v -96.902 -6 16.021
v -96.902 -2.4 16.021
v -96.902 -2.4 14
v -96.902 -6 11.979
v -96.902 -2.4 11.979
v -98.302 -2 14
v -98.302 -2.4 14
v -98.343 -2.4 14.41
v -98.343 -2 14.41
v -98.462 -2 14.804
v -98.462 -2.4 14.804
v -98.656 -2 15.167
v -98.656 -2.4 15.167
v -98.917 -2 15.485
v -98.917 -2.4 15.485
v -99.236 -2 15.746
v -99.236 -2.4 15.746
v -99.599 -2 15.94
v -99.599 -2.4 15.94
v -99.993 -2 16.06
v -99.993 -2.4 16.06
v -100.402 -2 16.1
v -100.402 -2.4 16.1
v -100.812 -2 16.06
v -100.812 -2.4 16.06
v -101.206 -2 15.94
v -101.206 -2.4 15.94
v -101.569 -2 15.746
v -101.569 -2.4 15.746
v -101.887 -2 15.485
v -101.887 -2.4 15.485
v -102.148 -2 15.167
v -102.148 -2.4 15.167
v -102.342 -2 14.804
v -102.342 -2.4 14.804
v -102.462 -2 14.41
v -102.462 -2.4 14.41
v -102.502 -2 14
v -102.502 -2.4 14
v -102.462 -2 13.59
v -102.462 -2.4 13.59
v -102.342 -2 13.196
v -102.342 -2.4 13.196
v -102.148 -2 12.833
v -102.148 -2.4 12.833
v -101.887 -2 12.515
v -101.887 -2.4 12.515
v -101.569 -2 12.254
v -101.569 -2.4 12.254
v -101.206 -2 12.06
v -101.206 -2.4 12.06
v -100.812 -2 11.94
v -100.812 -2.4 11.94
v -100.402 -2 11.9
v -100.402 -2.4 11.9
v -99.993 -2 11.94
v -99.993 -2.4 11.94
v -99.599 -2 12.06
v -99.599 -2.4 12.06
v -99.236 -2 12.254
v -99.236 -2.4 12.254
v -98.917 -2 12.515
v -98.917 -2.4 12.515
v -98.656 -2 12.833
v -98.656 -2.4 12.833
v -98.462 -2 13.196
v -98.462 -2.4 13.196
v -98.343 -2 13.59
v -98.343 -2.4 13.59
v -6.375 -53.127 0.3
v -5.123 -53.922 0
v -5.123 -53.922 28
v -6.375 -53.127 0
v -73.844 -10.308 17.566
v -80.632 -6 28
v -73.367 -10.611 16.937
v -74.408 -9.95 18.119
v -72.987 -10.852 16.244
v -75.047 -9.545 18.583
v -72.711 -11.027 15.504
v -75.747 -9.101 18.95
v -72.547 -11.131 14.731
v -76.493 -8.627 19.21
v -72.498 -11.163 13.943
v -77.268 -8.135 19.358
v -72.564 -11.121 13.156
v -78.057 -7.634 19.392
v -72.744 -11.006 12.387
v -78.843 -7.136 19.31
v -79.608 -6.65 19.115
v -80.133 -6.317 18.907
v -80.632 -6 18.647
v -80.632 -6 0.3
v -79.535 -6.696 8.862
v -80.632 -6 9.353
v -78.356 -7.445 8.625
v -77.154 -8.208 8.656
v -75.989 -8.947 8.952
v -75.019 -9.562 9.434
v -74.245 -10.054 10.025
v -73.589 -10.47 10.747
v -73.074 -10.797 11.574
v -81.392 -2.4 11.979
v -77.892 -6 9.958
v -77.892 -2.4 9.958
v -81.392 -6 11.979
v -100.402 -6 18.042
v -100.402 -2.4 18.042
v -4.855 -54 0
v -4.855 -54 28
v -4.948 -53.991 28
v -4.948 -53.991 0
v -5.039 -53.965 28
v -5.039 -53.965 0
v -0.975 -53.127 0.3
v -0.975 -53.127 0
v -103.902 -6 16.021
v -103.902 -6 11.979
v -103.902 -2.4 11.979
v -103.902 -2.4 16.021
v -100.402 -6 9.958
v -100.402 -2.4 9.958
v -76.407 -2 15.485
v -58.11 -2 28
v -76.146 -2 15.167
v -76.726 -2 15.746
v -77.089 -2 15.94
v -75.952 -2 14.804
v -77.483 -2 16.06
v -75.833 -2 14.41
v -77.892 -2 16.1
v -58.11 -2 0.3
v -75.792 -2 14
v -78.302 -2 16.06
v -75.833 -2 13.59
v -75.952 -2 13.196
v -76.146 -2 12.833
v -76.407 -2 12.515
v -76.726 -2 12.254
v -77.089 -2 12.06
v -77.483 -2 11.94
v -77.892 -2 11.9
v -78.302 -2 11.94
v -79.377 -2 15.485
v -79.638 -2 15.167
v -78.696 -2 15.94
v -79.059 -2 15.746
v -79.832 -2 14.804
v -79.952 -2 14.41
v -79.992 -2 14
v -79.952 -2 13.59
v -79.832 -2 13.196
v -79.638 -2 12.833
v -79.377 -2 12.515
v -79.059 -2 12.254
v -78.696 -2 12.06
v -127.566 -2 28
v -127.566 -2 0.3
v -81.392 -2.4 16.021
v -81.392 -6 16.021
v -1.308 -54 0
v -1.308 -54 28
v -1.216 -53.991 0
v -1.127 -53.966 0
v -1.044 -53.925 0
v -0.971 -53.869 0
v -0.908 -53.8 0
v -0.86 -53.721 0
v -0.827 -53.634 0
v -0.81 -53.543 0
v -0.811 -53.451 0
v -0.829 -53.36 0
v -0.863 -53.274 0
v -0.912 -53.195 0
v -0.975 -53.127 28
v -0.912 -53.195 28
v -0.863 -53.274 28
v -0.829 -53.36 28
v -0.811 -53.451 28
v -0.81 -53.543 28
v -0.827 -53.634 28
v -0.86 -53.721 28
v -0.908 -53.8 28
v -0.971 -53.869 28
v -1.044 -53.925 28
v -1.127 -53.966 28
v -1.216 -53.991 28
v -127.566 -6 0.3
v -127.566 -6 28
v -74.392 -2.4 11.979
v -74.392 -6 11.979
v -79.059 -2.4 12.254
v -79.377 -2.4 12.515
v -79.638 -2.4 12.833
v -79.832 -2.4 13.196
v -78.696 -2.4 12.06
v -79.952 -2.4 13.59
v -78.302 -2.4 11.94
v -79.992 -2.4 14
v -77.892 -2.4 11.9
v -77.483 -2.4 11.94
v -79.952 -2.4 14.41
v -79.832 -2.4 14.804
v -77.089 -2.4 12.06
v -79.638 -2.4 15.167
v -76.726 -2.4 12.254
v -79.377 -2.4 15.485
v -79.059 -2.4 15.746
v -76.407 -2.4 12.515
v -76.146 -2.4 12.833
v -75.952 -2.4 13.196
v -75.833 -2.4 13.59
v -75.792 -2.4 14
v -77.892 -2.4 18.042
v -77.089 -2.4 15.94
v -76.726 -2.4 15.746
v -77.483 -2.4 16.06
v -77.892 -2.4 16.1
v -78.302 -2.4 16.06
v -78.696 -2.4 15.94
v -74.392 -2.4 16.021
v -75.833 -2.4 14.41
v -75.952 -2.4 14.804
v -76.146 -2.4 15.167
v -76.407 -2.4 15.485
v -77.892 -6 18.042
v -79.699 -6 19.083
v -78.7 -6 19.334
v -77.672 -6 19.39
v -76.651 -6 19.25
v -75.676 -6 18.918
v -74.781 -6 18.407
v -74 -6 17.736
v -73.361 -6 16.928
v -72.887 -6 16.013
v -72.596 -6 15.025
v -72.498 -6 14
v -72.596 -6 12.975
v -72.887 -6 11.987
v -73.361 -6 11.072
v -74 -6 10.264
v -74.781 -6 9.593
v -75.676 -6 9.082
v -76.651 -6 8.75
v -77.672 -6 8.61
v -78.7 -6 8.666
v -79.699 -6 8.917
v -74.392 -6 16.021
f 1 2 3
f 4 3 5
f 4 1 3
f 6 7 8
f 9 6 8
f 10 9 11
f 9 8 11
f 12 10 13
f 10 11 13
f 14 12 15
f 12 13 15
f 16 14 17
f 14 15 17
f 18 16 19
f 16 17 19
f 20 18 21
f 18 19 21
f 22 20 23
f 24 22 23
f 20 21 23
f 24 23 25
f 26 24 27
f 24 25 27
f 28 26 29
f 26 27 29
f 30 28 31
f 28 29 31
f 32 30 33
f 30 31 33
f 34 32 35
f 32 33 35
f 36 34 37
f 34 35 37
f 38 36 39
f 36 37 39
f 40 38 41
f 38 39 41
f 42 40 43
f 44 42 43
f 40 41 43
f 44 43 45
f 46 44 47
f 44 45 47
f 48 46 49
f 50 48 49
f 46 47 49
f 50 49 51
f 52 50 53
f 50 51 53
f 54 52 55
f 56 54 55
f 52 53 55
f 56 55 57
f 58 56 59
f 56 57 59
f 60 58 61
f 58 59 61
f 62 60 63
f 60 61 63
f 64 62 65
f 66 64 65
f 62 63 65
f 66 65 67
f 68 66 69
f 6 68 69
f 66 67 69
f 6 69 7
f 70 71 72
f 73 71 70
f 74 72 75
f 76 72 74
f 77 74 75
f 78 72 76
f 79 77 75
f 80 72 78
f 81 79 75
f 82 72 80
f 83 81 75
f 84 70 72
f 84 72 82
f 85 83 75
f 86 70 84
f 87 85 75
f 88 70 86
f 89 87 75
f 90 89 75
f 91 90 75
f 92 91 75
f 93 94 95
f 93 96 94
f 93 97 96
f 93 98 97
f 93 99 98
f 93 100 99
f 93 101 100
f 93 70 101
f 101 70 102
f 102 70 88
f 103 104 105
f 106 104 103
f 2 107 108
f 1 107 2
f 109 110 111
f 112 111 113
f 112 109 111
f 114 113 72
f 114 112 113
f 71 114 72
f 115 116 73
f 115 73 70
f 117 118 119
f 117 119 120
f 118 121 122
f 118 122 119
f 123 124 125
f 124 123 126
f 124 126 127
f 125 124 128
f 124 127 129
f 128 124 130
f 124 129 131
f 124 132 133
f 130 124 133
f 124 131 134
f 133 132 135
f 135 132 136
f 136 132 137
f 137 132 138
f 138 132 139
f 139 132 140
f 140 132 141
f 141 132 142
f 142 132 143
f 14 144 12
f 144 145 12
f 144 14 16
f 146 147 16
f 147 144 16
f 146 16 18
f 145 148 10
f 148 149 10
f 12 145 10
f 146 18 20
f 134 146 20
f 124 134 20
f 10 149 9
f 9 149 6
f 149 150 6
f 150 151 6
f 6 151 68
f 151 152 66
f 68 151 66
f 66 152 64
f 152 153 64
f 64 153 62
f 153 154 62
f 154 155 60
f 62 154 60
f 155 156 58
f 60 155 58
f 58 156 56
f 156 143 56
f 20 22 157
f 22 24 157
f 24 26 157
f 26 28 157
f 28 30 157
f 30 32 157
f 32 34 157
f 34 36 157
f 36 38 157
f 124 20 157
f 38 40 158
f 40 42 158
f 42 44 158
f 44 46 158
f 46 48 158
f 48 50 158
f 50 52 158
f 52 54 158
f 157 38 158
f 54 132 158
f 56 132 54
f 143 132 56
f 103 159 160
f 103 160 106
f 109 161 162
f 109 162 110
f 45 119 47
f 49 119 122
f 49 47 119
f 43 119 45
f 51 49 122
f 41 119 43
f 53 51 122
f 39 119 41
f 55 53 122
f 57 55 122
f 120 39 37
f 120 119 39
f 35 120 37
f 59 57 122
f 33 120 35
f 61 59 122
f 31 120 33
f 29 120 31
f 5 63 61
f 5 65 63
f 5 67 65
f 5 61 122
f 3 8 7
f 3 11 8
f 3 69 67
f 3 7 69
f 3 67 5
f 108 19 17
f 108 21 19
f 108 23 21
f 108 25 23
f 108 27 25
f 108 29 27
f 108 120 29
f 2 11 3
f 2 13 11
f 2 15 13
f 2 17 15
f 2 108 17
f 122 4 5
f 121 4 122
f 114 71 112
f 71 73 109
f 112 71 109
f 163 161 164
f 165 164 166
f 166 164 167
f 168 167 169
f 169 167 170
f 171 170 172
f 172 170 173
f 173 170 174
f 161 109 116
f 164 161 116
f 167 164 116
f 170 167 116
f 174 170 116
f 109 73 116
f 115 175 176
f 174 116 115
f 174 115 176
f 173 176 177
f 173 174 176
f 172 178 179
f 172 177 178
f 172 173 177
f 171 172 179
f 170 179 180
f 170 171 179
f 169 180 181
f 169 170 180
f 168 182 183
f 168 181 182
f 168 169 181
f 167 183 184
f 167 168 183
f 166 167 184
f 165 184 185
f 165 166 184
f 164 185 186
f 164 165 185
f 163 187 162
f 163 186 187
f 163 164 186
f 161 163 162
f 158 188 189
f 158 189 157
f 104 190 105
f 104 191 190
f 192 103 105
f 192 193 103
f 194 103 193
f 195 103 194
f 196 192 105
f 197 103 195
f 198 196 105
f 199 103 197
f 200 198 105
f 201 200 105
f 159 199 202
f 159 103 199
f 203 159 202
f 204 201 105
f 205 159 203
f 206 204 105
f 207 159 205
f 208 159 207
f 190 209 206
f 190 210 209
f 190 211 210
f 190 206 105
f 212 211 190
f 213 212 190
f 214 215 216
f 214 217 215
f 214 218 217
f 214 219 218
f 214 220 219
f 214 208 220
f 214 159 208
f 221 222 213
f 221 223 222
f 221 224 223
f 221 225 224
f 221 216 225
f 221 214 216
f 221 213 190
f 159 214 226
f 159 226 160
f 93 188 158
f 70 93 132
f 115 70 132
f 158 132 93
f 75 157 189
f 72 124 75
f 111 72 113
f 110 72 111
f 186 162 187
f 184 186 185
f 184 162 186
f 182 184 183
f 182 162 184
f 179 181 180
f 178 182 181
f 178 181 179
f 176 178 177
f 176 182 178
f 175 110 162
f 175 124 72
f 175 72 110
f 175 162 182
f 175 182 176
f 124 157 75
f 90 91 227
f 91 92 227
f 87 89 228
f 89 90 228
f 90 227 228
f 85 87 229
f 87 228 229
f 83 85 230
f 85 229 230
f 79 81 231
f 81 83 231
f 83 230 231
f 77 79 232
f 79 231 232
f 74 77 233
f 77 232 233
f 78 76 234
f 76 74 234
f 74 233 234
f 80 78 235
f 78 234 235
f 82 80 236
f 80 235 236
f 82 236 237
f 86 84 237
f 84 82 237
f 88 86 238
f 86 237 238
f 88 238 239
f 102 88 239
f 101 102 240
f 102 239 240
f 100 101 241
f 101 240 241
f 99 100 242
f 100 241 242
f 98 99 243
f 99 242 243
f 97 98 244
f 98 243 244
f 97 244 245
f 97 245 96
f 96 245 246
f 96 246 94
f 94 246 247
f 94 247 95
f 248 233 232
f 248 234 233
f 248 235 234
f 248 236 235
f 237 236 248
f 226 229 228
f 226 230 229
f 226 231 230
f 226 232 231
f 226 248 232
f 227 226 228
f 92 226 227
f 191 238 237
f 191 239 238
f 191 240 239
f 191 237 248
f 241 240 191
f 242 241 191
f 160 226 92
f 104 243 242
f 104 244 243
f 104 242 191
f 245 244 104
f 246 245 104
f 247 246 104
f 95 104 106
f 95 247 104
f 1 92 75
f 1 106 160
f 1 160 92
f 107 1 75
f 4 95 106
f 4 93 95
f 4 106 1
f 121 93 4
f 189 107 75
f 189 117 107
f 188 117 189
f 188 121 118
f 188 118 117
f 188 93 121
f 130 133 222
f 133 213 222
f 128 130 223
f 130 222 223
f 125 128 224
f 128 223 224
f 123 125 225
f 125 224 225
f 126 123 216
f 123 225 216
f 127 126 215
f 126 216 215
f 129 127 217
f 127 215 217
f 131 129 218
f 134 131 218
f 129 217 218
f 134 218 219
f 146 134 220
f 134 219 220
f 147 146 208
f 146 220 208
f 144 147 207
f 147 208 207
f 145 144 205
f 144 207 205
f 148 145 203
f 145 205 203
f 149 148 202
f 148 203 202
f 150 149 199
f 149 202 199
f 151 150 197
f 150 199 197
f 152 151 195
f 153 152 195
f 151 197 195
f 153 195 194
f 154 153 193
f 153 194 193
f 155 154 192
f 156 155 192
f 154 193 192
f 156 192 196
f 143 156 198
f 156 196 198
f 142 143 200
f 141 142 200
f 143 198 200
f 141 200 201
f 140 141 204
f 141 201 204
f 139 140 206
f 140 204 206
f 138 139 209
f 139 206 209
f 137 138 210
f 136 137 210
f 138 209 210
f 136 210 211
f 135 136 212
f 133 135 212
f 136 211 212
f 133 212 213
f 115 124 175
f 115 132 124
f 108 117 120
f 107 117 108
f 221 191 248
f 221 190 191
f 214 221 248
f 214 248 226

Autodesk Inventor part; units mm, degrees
ref_plane "YZ Plane" through (0, 0, 0) normal (1, 0, 0) x (0, 1, 0)
ref_plane "XZ Plane" through (0, 0, 0) normal (0, 1, 0) x (-1, 0, 0)
ref_plane "Work Plane1" through (0, 0, 0) normal (0, 0, 1) x (1, 0, 0)
sketch "Sketch1" plane through (0, 0, 0) normal (0, 0, 1) x (1, 0, 0)
  line L0 (-80.6325, -6) -> (-735.8557, -6) projected
  line L1 (-5.1227, -53.9222) -> (-80.6325, -6) projected
  line L2 (-1.3085, -54) -> (-4.8547, -54) projected
  line L3 (-58.1097, -2) -> (-0.9751, -53.1274) projected
  line L4 (-731.3557, -2) -> (-735.8557, -6) projected
  line L5 (-127.5657, -6) -> (-127.5657, 0)
  arc A0 (-5.1227, -53.9222) -> (-4.8547, -54) centre (-4.8547, -53.5) ccw projected
  arc A1 (-1.3085, -54) -> (-0.9751, -53.1274) centre (-1.3085, -53.5) ccw projected
  line L6 (-58.1097, -2) -> (-731.3557, -2) projected
  point P0 (0, 0)
  point P1 (-127.5657, -2)
ref_plane "Work Plane2" through (-788.7937, -153, 28) normal (0, 0, 1) x (1, 0, 0)
extrude "Extrusion1" add sketch "Sketch1" along normal up to surface (28 mm away) contours L0 L5 L6 L3 A1 L2 A0 L1
sketch "Sketch2" plane through (-127.5657, -6, 0) normal (0, -1, 0) x (1, 0, 0)
  circle A0 centre (27.1635, 14) radius 2.1 projected
  line L0 (27.1635, 14) -> (30.6635, 14)
  line L1 (30.6635, 11.9793) -> (27.1635, 9.9585)
  line L2 (27.1635, 9.9585) -> (23.6635, 11.9793)
  line L3 (23.6635, 11.9793) -> (23.6635, 16.0207)
  line L4 (23.6635, 16.0207) -> (27.1635, 18.0415)
  line L5 (27.1635, 18.0415) -> (30.6635, 16.0207)
  line L6 (30.6635, 16.0207) -> (30.6635, 11.9793)
  point P0 (127.5657, 0)
  dimension "d2" = 3.5
extrude "Extrusion2" cut sketch "Sketch2" against normal blind 3.6 contours A0 | L6 L1 L2 L3 L4 L5
sketch "Sketch3" plane through (-127.5657, -2.4, 0) normal (0, -1, 0) x (1, 0, 0)
  line L0 (27.1635, 18.0415) -> (30.6635, 16.0207) projected
  line L1 (23.6635, 16.0207) -> (27.1635, 18.0415) projected
  line L2 (23.6635, 11.9793) -> (23.6635, 16.0207) projected
  line L3 (27.1635, 9.9585) -> (23.6635, 11.9793) projected
  line L4 (30.6635, 11.9793) -> (27.1635, 9.9585) projected
  line L5 (30.6635, 16.0207) -> (30.6635, 11.9793) projected
  circle A0 centre (27.1635, 14) radius 2.1
  point P0 (127.5657, 0)
  dimension "d5" = 4.2
extrude "Extrusion3" cut sketch "Sketch3" against normal through all contours A0
sketch "Sketch4" plane through (-127.5657, -6, 0) normal (0, -1, 0) x (1, 0, 0)
  line L0 (23.6635, 16.0207) -> (27.1635, 18.0415) projected
  line L1 (27.1635, 18.0415) -> (30.6635, 16.0207) projected
  line L2 (30.6635, 16.0207) -> (30.6635, 11.9793) projected
  line L3 (30.6635, 11.9793) -> (27.1635, 9.9585) projected
  line L4 (27.1635, 9.9585) -> (23.6635, 11.9793) projected
  line L5 (23.6635, 11.9793) -> (23.6635, 16.0207) projected
  line L6 (46.9332, 28) -> (0, 28) projected
  line L7 (0, 0) -> (0, 28) projected
  line L8 (0, 0) -> (46.9332, 0) projected
  line L9 (46.9332, 0) -> (46.9332, 28) projected
  line L10 (49.6735, 14) -> (46.1735, 14)
  line L11 (46.1735, 16.0207) -> (49.6735, 18.0415)
  line L12 (49.6735, 18.0415) -> (53.1735, 16.0207)
  line L13 (53.1735, 16.0207) -> (53.1735, 11.9793)
  line L14 (53.1735, 11.9793) -> (49.6735, 9.9585)
  line L15 (49.6735, 9.9585) -> (46.1735, 11.9793)
  line L16 (46.1735, 11.9793) -> (46.1735, 16.0207)
  circle A0 centre (49.6735, 14) radius 2.1
  line L17 (47.5735, 20) -> (47.5735, 10) projected
  arc A1 (47.5735, 10) -> (51.7735, 10) centre (49.6735, 10) ccw projected
  line L18 (51.7735, 10) -> (51.7735, 20) projected
  arc A2 (51.7735, 20) -> (47.5735, 20) centre (49.6735, 20) ccw projected
  line L19 (45.6735, 10) -> (45.6735, 20) projected
  arc A3 (53.6735, 20) -> (45.6735, 20) centre (49.6735, 20) ccw projected
  line L20 (53.6735, 10) -> (53.6735, 20) projected
  arc A4 (45.6735, 10) -> (53.6735, 10) centre (49.6735, 10) ccw projected
  point P0 (127.5657, 0)
  dimension "d8" = 3.5
  dimension "d9" = 4.2
extrude "Extrusion4" cut sketch "Sketch4" against normal up to surface (3.6 mm away) contours L11 L17 L10 L9 | L9 L10 L16 L11 | L10 L17 L15 L9 | L9 L15 L16 L10 | L11 L12 L18 A0 L17 | A0 | A0 L18 L14 L15 L17 | L18 L12 L13 L14
sketch "Sketch5" plane through (-127.5657, -6, 0) normal (0, -1, 0) x (1, 0, 0)
  line L0 (46.9332, 11.5407) -> (46.1735, 11.9793) projected
  line L1 (46.1735, 11.9793) -> (46.1735, 16.0207) projected
  line L2 (46.1735, 16.0207) -> (46.9332, 16.4593) projected
  line L3 (46.9332, 16.4593) -> (46.9332, 28) projected
  line L4 (46.9332, 28) -> (0, 28) projected
  line L5 (0, 0) -> (0, 28) projected
  line L6 (0, 0) -> (46.9332, 0) projected
  line L7 (46.9332, 0) -> (46.9332, 11.5407) projected
  line L8 (23.6635, 16.0207) -> (27.1635, 18.0415) projected
  line L9 (27.1635, 18.0415) -> (30.6635, 16.0207) projected
  line L10 (30.6635, 16.0207) -> (30.6635, 11.9793) projected
  line L11 (30.6635, 11.9793) -> (27.1635, 9.9585) projected
  line L12 (27.1635, 9.9585) -> (23.6635, 11.9793) projected
  line L13 (23.6635, 11.9793) -> (23.6635, 16.0207) projected
  line L14 (53.1735, 11.9793) -> (53.1735, 16.0207) projected
  line L15 (49.6735, 9.9585) -> (53.1735, 11.9793) projected
  circle A0 centre (49.6735, 14) radius 2.1 projected
  point P0 (127.5657, 0)
extrude "Extrusion5" cut sketch "Sketch5" along normal blind 10 contours A0
sketch "Sketch6" plane through (-74.3922, -2.4, 11.9793) normal (0, -1, 0) x (1, 0, 0)
  line L0 (-7, 0) -> (-3.5, -2.0207) projected
  line L1 (-3.5, -2.0207) -> (0, 0) projected
  line L2 (0, 0) -> (0, 4.0415) projected
  line L3 (0, 4.0415) -> (-3.5, 6.0622) projected
  line L4 (-3.5, 6.0622) -> (-7, 4.0415) projected
  line L5 (-7, 4.0415) -> (-7, 0) projected
  point P0 (74.3922, -11.9793)
extrude "Extrusion6" cut sketch "Sketch6" along normal blind 10
sketch "Sketch7" plane through (-74.3922, -2.4, 11.9793) normal (0, -1, 0) x (1, 0, 0)
  circle A0 centre (-3.5, 2.0207) radius 2.1 projected
  arc A1 (-3.5, -1.9793) -> (-3.5, 6.0207) centre (-3.5, 2.0207) ccw projected
  line L0 (-26.01, -1.9793) -> (-3.5, -1.9793) projected
  line L1 (-671.6821, 16.0207) -> (3.99, 16.0207) projected
  line L2 (3.99, -58.9793) -> (3.99, 16.0207) projected
  line L3 (-671.6821, -58.9793) -> (3.99, -58.9793) projected
  line L4 (-671.6821, -58.9793) -> (-671.6821, 16.0207) projected
  arc A2 (-30.01, -1.9793) -> (-22.01, -1.9793) centre (-26.01, -1.9793) ccw projected
  line L5 (-22.01, -1.9793) -> (-22.01, 8.0207) projected
  arc A3 (-22.01, 8.0207) -> (-30.01, 8.0207) centre (-26.01, 8.0207) ccw projected
  line L6 (-30.01, 8.0207) -> (-30.01, -1.9793) projected
  arc A4 (-7.5, -1.9793) -> (0.5, -1.9793) centre (-3.5, -1.9793) ccw projected
  line L7 (0.5, -1.9793) -> (0.5, 8.0207) projected
  arc A5 (0.5, 8.0207) -> (-7.5, 8.0207) centre (-3.5, 8.0207) ccw projected
  line L8 (-7.5, 8.0207) -> (-7.5, -1.9793) projected
  point P0 (74.3922, -11.9793)
extrude "Extrusion7" cut sketch "Sketch7" against normal blind 10 contours A0
sketch "Sketch8" plane through (-127.5657, -6, 0) normal (0, -1, 0) x (1, 0, 0)
  line L0 (46.9332, 11.5407) -> (46.1735, 11.9793) projected
  line L1 (46.1735, 11.9793) -> (46.1735, 16.0207) projected
  line L2 (46.1735, 16.0207) -> (46.9332, 16.4593) projected
  line L3 (46.9332, 16.4593) -> (46.9332, 28) projected
  line L4 (46.9332, 28) -> (0, 28) projected
  line L5 (0, 0) -> (0, 28) projected
  line L6 (0, 0) -> (46.9332, 0) projected
  line L7 (46.9332, 0) -> (46.9332, 11.5407) projected
  line L8 (23.6635, 16.0207) -> (27.1635, 18.0415) projected
  line L9 (27.1635, 18.0415) -> (30.6635, 16.0207) projected
  line L10 (30.6635, 16.0207) -> (30.6635, 11.9793) projected
  line L11 (30.6635, 11.9793) -> (27.1635, 9.9585) projected
  line L12 (27.1635, 9.9585) -> (23.6635, 11.9793) projected
  line L13 (23.6635, 11.9793) -> (23.6635, 16.0207) projected
  circle A0 centre (49.6735, 14) radius 5.3947
  line L14 (47.5735, 20) -> (47.5735, 10) projected
  arc A1 (47.5735, 10) -> (51.7735, 10) centre (49.6735, 10) ccw projected
  line L15 (51.7735, 10) -> (51.7735, 20) projected
  arc A2 (51.7735, 20) -> (47.5735, 20) centre (49.6735, 20) ccw projected
  line L16 (45.6735, 10) -> (45.6735, 20) projected
  arc A3 (53.6735, 20) -> (45.6735, 20) centre (49.6735, 20) ccw projected
  line L17 (53.6735, 10) -> (53.6735, 20) projected
  arc A4 (45.6735, 10) -> (53.6735, 10) centre (49.6735, 10) ccw projected
  point P0 (127.5657, 0)
  point P1 (46.9332, 9.3532)
  point P2 (46.9332, 18.6468)
extrude "Extrusion8" cut sketch "Sketch8" along normal blind 10 contours L0 L1 L2 L3 A0 L14 A1 L7 | A1 L14 A0 L15 | A1 L15 A0 L17 | L17 A0
ref_plane "Work Plane3" through (0, -54, -47) normal (-1, 0, 0) x (0, 0, 1)
sketch "Sketch9" plane through (0, -54, -47) normal (-1, 0, 0) x (0, 0, 1)
  line L0 (0, 0.8726) -> (47, 0.8726) projected
  line L1 (0, 63) -> (0, 0.8726) projected
  line L2 (0, 63) -> (75, 63) projected
  line L3 (75, 52) -> (75, 63) projected
  line L4 (47, 52) -> (47, 0.8726) projected
  line L5 (75, 52) -> (75, 0.8726) projected
  line L6 (47, 0.8726) -> (75, 0.8726) projected
  line L7 (47, 0.8726) -> (47, 52) projected
  line L8 (47, 54) -> (75, 54) projected
  line L9 (47, 0.8726) -> (47.3, 0.8726)
  line L10 (47.3, 0.8726) -> (47.3, 54)
  line L11 (47.3, 54) -> (47, 54)
  line L12 (47, 54) -> (47, 0.8726)
  line L13 (47, 52) -> (75, 52) projected
  line L14 (47, 52) -> (75, 52) projected
  dimension "d20" = 0.3
extrude "Extrusion9" cut sketch "Sketch9" along normal up to surface (127.5657 mm away) contours L4 L13 L10 L6 | L12 L8 L10 L13
properties part number "zaślepka-1"
